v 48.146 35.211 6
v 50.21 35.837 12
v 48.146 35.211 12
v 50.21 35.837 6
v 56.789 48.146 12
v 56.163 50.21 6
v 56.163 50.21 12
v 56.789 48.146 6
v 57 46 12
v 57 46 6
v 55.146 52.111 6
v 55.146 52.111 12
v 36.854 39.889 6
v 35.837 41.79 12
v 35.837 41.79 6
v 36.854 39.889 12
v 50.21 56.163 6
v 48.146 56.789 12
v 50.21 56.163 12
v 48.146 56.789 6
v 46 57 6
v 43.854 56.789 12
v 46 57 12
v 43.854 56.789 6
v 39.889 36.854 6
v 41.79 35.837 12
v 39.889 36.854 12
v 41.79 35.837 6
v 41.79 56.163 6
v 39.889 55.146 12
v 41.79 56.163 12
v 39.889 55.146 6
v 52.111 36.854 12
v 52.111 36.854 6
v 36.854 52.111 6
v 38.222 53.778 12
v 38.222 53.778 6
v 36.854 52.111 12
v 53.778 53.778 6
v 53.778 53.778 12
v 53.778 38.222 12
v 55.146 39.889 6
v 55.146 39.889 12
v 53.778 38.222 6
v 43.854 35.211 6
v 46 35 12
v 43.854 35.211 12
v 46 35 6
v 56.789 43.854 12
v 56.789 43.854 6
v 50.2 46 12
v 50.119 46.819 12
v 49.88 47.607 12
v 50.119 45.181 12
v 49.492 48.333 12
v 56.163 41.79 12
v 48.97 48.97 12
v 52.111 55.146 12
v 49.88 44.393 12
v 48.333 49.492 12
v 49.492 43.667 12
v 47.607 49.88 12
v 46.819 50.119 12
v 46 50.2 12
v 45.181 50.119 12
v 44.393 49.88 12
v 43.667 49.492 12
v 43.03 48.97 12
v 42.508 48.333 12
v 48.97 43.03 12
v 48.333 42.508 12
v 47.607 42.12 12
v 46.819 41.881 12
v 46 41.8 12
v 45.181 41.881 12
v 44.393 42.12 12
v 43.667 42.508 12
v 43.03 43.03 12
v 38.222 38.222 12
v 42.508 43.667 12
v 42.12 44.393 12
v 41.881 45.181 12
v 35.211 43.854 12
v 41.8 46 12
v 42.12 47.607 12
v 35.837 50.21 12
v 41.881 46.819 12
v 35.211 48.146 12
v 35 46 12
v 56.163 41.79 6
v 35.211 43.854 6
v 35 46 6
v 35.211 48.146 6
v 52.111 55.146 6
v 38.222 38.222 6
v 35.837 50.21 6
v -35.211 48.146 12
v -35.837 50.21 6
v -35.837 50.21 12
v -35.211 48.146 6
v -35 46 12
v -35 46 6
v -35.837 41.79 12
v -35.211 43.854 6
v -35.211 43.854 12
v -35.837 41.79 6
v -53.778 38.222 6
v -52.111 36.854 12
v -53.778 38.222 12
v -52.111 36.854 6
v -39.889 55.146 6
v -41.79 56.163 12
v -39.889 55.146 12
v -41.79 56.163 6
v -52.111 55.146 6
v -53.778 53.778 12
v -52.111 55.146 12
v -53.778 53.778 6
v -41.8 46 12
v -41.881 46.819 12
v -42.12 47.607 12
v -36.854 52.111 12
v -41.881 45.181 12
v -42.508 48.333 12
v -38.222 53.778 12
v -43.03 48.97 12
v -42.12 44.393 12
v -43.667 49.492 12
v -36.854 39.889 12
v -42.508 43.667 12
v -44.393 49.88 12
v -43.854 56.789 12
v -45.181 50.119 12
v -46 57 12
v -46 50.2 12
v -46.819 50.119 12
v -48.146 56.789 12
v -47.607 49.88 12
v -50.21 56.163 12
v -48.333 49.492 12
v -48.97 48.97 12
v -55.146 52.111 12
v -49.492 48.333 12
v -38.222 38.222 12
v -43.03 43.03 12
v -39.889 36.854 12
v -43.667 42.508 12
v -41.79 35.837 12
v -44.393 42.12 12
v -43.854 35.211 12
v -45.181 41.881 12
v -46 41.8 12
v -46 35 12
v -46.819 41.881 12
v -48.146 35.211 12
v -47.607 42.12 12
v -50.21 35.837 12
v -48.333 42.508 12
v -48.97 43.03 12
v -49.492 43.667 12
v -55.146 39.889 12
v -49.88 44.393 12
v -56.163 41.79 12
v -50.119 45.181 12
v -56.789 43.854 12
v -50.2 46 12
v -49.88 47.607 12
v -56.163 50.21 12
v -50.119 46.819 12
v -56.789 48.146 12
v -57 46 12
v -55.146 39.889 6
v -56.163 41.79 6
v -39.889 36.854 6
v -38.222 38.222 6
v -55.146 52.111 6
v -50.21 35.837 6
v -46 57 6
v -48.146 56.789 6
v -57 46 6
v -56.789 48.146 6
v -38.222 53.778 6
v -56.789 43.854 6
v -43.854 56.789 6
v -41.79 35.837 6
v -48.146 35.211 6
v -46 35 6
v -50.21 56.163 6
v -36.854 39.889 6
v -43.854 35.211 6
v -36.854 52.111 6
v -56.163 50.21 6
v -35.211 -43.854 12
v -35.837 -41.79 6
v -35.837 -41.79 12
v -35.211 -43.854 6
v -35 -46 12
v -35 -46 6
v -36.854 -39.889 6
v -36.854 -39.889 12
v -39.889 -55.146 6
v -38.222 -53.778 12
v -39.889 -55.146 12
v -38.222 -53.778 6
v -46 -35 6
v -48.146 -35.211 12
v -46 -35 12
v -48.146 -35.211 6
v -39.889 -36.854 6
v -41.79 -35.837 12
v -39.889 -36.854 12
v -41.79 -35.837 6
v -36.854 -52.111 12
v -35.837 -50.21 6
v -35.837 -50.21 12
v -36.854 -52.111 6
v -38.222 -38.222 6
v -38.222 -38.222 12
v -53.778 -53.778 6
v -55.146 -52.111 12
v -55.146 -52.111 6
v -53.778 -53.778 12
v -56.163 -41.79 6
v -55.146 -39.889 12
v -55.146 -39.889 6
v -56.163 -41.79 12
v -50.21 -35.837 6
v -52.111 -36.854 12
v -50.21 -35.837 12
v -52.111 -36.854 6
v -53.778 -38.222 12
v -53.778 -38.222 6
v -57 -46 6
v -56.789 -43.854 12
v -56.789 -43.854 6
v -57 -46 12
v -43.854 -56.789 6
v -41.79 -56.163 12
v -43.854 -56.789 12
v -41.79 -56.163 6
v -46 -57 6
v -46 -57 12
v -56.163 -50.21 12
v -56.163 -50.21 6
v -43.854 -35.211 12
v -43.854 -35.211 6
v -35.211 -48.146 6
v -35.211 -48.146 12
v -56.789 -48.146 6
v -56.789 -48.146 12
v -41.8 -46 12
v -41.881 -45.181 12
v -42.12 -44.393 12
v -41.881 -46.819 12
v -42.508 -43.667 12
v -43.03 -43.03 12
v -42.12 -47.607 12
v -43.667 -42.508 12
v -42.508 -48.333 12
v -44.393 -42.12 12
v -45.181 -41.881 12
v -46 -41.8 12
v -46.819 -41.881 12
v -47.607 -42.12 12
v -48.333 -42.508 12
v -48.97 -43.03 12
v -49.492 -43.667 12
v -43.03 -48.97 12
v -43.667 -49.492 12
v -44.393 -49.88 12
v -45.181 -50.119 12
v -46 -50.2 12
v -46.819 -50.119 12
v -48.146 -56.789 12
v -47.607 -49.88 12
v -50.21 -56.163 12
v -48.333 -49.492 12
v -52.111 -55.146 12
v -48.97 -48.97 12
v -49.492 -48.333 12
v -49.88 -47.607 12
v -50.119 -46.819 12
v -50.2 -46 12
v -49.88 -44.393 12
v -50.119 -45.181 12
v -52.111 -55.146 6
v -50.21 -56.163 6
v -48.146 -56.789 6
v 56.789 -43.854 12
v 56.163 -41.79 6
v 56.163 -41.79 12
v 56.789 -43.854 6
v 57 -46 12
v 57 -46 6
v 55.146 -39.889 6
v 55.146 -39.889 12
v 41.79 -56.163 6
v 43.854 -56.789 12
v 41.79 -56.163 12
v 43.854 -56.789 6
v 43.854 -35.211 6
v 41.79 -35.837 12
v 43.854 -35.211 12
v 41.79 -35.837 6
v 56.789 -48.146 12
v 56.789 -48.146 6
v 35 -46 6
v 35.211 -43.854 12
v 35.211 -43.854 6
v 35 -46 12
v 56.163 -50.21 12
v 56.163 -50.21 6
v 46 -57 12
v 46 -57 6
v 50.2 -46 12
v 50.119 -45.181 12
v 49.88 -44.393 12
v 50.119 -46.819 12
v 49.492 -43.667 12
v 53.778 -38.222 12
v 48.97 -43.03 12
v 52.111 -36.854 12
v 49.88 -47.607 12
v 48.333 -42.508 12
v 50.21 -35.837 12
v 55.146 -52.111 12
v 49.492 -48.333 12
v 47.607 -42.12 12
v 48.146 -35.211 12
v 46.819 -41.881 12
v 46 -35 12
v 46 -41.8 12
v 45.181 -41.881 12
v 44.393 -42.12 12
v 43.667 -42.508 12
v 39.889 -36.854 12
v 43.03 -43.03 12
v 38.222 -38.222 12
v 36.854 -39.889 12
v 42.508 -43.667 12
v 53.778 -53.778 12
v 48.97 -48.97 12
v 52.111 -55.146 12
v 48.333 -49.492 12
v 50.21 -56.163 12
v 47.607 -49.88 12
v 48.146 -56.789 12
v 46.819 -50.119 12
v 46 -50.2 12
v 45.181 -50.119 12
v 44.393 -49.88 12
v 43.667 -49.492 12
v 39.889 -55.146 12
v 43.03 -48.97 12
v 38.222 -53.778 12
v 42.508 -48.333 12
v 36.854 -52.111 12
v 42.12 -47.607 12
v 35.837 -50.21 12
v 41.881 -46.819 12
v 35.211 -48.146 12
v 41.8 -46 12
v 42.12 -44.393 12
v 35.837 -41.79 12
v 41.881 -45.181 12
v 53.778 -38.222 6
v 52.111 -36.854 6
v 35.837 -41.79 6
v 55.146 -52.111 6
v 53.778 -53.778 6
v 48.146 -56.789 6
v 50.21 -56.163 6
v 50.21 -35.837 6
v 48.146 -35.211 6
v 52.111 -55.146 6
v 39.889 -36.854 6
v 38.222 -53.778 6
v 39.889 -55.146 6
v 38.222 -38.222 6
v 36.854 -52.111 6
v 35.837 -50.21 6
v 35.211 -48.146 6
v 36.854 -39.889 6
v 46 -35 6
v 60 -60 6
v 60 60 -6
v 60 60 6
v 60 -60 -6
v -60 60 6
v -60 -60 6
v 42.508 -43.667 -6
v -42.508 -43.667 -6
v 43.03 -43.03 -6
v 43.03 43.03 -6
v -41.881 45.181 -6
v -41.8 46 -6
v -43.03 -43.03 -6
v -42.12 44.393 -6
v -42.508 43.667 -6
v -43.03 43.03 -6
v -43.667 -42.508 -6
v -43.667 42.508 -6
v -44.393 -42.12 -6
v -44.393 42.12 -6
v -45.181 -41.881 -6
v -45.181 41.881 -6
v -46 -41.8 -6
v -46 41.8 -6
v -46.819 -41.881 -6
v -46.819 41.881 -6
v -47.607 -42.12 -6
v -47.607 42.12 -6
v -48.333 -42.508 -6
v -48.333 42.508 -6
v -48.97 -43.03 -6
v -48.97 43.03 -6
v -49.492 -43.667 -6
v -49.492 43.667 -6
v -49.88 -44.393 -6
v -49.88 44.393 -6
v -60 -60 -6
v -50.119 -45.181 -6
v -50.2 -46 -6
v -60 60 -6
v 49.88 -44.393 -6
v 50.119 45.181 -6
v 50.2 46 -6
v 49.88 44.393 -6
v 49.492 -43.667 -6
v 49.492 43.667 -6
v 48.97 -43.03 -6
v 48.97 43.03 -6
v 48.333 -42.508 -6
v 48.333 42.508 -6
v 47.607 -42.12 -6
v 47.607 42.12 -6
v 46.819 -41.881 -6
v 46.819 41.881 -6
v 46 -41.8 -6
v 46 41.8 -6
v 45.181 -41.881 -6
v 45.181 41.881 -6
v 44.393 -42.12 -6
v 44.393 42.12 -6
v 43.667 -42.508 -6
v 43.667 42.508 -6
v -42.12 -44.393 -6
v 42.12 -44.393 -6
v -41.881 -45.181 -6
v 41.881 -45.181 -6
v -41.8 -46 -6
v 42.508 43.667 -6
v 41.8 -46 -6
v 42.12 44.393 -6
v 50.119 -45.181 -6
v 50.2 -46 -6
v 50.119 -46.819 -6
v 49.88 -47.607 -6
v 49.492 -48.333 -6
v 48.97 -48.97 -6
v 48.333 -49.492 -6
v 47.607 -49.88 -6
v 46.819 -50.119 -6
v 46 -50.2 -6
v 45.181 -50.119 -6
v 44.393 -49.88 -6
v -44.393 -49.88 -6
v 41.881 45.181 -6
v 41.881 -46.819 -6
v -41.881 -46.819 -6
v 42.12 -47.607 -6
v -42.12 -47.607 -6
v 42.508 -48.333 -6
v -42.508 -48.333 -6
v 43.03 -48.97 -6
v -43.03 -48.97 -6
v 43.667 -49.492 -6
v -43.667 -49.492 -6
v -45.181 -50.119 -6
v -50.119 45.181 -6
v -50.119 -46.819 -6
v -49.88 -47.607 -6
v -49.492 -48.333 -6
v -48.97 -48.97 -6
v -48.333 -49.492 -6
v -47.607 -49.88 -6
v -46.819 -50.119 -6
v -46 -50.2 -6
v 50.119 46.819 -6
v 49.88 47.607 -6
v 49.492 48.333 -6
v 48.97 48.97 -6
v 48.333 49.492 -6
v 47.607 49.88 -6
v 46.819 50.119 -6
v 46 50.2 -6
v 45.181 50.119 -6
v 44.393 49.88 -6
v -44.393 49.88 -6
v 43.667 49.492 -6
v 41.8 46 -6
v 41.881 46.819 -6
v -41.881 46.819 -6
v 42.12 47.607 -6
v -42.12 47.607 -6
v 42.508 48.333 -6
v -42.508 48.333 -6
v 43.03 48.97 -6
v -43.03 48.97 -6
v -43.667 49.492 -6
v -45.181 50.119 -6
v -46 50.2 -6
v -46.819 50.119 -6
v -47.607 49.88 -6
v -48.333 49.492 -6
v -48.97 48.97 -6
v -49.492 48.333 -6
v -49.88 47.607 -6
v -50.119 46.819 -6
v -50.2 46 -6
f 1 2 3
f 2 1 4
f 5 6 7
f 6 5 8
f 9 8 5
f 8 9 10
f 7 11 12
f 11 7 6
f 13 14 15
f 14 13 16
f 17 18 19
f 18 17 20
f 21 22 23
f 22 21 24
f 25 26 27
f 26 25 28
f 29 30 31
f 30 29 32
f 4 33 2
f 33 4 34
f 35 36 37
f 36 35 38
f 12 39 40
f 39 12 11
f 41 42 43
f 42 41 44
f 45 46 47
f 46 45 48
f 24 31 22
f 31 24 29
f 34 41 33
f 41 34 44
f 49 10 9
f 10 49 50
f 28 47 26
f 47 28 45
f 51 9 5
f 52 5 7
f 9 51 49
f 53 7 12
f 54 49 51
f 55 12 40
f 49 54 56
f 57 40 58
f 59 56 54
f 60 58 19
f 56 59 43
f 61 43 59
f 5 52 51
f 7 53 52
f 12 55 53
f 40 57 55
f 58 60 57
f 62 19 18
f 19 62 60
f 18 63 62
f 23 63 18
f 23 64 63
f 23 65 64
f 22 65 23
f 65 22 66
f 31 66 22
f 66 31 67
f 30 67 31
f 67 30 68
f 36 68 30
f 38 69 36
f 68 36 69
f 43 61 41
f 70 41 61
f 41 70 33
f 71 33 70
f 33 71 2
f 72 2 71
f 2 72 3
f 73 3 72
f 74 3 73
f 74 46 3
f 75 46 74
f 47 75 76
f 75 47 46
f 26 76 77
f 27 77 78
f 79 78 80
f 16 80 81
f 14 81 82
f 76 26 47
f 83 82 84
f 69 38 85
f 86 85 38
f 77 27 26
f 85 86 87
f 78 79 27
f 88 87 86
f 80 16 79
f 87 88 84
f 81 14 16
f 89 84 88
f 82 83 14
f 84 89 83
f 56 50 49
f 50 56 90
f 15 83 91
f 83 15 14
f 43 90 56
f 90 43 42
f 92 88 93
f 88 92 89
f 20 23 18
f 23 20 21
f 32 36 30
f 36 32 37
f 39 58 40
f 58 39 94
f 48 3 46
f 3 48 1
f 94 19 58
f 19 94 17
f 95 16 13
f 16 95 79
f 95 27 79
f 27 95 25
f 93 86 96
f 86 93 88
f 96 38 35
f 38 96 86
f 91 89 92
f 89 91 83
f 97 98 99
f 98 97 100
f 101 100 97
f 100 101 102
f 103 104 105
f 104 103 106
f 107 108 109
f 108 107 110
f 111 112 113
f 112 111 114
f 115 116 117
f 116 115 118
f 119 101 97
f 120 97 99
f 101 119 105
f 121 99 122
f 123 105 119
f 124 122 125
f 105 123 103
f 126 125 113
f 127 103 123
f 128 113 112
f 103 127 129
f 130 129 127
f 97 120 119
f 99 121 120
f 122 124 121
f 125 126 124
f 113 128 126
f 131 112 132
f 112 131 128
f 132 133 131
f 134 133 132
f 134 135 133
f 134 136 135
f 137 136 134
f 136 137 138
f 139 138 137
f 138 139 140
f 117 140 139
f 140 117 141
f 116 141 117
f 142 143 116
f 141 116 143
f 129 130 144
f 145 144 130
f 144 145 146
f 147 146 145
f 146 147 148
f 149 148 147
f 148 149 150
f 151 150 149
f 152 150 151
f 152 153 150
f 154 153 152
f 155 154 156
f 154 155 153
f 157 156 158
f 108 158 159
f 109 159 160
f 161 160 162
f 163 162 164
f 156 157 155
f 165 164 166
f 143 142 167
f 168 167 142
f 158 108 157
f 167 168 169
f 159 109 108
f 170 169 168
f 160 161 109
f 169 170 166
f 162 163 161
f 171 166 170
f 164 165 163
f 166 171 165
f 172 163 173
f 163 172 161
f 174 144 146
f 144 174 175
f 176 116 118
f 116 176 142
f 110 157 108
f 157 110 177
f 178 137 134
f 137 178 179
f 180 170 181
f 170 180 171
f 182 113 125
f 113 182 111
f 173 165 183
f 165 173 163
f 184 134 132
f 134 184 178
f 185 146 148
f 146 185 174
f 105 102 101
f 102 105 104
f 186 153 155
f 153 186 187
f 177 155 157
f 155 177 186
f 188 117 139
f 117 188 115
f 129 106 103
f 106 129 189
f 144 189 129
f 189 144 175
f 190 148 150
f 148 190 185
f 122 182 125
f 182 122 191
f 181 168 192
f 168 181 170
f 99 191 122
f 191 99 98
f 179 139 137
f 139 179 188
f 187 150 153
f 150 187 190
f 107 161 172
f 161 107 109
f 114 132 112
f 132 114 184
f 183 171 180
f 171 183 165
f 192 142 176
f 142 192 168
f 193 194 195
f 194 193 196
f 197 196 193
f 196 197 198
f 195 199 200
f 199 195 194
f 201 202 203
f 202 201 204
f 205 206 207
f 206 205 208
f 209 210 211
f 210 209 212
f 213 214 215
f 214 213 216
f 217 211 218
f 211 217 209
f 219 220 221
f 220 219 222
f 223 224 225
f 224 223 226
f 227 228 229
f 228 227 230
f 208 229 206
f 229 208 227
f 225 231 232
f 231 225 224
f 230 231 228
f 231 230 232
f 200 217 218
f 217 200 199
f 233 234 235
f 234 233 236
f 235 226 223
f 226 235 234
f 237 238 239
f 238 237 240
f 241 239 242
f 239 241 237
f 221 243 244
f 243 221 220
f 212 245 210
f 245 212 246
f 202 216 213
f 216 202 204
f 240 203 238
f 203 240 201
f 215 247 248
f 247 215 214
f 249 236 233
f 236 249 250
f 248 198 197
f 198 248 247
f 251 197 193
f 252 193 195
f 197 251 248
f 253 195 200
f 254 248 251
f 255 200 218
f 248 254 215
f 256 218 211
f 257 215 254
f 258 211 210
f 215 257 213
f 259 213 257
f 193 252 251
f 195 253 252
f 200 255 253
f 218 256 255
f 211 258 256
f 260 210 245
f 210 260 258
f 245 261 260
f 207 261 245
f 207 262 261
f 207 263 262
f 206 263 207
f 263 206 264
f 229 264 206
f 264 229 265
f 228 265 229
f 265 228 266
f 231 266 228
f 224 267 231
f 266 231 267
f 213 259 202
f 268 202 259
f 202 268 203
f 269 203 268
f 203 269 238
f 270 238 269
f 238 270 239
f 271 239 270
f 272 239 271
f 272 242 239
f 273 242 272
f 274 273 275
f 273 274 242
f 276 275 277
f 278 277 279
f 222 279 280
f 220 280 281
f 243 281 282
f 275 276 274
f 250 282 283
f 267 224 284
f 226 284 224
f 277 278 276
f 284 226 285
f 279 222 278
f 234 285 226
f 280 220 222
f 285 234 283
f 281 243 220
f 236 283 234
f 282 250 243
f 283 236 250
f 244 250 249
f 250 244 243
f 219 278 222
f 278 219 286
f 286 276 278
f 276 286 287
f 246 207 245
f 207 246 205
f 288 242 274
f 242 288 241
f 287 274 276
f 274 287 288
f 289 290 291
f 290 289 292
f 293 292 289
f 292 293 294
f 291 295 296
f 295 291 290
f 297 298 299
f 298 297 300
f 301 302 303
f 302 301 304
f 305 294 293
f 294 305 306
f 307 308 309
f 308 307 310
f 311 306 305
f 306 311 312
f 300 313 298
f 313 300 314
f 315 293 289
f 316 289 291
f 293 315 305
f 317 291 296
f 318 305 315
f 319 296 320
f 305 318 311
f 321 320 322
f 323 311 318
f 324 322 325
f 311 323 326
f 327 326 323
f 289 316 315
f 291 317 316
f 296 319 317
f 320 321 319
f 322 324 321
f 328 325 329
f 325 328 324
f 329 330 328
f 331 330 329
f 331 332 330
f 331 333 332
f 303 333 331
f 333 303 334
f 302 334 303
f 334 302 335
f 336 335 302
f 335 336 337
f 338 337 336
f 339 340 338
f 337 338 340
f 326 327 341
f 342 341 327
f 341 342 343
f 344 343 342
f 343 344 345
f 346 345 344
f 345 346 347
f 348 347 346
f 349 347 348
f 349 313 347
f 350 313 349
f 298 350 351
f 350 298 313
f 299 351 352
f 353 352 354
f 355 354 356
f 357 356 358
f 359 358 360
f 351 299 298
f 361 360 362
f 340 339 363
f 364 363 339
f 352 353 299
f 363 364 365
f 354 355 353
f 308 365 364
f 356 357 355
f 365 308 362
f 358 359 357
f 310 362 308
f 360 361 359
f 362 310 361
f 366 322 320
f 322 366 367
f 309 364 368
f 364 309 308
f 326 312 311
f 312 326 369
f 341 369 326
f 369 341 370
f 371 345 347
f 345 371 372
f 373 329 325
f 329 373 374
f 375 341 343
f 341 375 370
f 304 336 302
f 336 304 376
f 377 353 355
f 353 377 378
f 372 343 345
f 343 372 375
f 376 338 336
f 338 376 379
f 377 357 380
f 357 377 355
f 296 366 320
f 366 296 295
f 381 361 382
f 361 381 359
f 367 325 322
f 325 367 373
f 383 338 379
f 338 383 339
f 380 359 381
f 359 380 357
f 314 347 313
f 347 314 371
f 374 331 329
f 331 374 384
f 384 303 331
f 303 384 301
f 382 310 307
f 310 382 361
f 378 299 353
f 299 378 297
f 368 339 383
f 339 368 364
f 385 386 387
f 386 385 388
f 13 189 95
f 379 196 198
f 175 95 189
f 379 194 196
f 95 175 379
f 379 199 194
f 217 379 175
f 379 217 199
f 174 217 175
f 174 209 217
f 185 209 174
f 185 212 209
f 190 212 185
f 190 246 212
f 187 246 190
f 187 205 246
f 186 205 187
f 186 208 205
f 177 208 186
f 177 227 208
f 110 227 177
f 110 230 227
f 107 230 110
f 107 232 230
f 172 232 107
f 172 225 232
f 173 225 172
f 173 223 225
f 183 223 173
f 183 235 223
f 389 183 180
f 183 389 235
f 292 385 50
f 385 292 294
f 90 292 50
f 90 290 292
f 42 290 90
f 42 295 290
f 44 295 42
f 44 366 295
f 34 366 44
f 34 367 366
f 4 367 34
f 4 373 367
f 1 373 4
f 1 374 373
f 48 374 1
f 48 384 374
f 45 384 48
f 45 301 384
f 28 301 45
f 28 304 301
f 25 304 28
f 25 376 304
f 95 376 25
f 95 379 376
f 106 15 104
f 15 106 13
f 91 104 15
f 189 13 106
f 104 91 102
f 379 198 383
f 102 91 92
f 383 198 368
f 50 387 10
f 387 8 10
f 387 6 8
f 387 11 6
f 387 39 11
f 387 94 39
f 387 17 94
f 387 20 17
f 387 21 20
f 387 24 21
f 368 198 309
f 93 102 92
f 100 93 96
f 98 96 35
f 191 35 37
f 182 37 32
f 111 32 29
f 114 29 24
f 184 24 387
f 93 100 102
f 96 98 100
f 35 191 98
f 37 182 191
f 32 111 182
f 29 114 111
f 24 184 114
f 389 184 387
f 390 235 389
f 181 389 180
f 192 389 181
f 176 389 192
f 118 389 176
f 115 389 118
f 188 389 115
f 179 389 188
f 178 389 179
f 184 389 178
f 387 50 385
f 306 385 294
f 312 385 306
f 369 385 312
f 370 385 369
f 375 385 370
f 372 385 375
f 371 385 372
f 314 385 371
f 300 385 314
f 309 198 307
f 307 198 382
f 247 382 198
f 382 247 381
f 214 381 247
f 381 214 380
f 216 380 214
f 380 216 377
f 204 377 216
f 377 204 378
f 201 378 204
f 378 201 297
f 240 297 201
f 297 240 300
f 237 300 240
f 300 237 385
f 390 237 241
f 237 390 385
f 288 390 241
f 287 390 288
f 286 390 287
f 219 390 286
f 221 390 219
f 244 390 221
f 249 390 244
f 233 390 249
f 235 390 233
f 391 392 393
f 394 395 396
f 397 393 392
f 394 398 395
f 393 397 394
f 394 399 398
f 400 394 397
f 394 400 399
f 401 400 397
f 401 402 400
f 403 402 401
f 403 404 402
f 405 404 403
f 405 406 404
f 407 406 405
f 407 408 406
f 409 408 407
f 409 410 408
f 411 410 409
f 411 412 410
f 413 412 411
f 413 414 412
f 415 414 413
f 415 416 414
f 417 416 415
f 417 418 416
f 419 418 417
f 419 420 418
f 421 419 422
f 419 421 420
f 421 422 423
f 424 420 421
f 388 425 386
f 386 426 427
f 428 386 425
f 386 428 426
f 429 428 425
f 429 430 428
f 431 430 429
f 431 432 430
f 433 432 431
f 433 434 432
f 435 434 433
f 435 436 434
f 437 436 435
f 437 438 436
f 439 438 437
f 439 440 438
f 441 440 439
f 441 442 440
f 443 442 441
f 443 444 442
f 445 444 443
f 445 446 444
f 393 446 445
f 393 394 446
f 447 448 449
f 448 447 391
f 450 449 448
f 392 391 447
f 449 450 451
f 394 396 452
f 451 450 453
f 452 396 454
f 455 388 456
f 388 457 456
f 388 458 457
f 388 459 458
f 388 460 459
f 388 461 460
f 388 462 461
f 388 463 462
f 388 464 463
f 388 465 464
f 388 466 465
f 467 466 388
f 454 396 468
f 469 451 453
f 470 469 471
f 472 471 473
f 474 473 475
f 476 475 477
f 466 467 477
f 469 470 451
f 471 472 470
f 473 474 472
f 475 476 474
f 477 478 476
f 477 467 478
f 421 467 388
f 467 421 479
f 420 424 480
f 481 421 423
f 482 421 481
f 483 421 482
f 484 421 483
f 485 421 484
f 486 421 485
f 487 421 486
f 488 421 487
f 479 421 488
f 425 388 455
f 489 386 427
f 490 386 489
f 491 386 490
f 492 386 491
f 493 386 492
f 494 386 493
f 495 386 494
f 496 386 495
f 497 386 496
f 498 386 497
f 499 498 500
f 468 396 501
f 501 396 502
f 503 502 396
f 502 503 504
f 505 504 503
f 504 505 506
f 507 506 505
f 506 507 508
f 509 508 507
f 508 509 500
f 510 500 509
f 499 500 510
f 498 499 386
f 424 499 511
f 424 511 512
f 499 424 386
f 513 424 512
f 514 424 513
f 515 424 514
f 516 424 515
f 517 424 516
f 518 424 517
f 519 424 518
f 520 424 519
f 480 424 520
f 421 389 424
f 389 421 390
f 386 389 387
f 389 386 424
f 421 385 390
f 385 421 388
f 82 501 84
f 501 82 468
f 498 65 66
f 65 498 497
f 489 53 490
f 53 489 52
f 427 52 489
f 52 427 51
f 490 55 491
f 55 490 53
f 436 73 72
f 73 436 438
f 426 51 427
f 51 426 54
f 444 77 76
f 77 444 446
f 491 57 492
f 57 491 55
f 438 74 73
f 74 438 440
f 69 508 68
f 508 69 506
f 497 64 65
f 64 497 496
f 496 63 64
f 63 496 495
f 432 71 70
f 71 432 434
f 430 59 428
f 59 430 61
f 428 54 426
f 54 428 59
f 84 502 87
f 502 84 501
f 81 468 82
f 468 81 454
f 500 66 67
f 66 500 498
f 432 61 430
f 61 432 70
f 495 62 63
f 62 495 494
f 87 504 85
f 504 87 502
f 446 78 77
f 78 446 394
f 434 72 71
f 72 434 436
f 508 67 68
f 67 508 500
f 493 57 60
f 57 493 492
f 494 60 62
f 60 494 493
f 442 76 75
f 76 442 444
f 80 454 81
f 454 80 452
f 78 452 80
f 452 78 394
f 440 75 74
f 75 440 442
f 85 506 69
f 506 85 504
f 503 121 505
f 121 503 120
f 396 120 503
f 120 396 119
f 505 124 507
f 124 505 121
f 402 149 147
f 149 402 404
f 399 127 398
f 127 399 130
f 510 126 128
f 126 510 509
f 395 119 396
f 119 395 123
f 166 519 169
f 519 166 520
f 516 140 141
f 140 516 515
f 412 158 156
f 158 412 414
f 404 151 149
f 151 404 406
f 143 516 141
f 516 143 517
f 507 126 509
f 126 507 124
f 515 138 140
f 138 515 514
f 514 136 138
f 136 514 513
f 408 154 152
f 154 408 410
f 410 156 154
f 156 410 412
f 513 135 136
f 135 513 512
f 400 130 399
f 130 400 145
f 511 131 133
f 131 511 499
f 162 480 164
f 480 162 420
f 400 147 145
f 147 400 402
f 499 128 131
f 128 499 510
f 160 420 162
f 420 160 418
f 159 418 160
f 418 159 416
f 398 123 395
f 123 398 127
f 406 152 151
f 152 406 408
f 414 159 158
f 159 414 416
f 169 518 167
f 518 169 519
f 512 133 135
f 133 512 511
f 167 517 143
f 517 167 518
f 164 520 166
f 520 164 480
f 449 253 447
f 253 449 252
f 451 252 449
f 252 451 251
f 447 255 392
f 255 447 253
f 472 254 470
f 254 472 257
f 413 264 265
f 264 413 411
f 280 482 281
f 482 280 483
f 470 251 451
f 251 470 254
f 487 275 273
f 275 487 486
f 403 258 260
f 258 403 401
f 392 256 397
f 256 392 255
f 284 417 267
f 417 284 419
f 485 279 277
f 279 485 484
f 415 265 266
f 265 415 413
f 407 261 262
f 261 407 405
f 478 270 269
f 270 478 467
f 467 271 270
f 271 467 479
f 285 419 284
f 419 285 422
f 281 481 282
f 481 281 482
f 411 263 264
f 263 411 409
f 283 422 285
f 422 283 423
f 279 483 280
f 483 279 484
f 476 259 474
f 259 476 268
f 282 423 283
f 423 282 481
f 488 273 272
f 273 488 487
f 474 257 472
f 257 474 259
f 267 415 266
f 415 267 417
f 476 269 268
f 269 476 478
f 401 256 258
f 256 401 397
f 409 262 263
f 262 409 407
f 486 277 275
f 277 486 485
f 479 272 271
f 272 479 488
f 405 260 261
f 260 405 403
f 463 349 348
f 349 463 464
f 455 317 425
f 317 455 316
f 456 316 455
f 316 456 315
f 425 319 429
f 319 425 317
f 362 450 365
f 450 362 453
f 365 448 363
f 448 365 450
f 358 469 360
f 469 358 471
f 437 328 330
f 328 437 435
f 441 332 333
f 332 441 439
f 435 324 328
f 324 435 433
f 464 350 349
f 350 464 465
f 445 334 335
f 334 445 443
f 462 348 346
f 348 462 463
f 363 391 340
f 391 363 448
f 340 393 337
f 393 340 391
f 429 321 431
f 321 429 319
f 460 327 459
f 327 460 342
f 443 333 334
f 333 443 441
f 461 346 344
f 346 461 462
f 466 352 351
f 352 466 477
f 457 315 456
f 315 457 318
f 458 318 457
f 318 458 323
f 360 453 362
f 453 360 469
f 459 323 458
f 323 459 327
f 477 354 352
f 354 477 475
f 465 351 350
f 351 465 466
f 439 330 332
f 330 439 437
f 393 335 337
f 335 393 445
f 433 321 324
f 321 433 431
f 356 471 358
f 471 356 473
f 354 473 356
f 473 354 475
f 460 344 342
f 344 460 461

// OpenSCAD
$fn = 32;

// ----------------------------------------------------------------------
// Anchor pads 120 x 120 x 18
// four corner bosses with anchor holes
// ----------------------------------------------------------------------

// --- parameters (mm) ---
plate = [120, 120, 12];  // base plate size (x, y, z)
pads = 4;                // boss count, one per corner
edge = 14;               // boss centre offset from the plate edge
boss_d = 22;             // boss diameter
boss_h = 6;              // boss height above the base plate
hole_d = 8.4;            // hole diameter

// --- derived feature positions (mm) ---
height = plate[2] + boss_h;      // = 18   overall height of the part
corner_x = plate[0] / 2 - edge;  // = 46   boss centre X
corner_y = plate[1] / 2 - edge;  // = 46   boss centre Y
feature_centers = [
  [corner_x, corner_y],
  [-corner_x, corner_y],
  [-corner_x, -corner_y],
  [corner_x, -corner_y]
];   // boss centres, anchor holes are drilled there

// base plate, four bosses standing on it, anchor holes all the way through
difference() {
  union() {
    cube(plate, center = true);
    for (centre = feature_centers)
      translate([centre[0], centre[1], plate[2] / 2 - 1])
        cylinder(d = boss_d, h = boss_h + 1);
  }
  for (centre = feature_centers)
    translate([centre[0], centre[1], -height])
      cylinder(d = hole_d, h = 2 * height + 2);  // through boss and plate
}
